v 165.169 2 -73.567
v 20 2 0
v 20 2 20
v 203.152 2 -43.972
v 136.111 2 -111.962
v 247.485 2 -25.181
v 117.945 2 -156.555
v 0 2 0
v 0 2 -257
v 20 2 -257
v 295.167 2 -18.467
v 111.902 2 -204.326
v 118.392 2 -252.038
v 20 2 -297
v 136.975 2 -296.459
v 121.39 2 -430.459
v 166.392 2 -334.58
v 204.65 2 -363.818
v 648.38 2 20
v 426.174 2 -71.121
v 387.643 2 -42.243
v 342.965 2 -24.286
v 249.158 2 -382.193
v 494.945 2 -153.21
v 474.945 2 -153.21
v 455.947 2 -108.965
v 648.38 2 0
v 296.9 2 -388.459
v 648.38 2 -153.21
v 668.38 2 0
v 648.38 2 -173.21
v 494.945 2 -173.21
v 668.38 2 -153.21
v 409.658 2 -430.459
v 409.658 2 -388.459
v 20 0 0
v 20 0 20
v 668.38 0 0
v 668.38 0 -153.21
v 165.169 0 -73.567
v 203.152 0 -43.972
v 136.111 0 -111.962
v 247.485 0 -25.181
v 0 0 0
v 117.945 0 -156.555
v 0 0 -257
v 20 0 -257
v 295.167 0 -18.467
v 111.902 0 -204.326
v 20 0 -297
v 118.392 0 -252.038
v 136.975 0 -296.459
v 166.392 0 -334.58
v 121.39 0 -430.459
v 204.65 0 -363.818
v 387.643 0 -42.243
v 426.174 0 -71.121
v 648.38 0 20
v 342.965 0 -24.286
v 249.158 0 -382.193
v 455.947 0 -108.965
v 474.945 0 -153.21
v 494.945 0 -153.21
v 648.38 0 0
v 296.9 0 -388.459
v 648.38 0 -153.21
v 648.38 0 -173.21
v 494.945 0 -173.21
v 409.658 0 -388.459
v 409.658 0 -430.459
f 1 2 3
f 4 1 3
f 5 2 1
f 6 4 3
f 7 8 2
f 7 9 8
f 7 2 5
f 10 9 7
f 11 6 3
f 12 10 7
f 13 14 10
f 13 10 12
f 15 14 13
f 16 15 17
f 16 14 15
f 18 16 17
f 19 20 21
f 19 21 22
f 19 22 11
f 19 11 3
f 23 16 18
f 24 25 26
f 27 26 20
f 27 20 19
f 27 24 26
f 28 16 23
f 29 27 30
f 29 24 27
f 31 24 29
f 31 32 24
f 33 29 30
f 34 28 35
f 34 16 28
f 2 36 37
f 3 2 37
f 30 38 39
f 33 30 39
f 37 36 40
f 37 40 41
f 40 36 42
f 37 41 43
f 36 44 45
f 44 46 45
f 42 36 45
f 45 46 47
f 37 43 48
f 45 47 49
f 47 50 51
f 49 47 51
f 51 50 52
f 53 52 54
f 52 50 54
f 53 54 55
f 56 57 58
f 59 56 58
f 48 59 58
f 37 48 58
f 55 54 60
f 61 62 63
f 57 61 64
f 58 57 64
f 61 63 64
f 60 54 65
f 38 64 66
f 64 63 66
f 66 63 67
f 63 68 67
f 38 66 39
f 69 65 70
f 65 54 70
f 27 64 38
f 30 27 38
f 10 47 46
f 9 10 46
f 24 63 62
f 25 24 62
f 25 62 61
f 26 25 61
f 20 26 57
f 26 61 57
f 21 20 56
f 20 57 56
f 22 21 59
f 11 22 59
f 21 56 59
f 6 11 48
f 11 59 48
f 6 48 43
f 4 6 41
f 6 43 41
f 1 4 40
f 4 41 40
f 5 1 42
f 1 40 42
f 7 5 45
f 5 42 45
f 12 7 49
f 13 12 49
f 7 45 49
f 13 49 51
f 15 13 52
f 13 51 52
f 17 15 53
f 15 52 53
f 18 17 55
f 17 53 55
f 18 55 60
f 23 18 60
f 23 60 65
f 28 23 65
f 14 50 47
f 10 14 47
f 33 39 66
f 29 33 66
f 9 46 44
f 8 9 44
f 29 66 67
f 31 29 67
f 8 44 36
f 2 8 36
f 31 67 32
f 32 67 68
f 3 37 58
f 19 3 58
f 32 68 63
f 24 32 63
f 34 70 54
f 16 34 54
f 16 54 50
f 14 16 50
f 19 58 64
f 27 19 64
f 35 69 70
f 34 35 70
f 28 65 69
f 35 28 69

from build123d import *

# Parameters (mm, degrees)
BOSS_EXTRUDE1_DEPTH = 2


with BuildPart() as part:
    # Sketch1 → Boss-Extrude1 (new body)
    with BuildSketch(Plane(origin=(0, 0, 0), x_dir=(1, 0, 0), z_dir=(0, 1, 0))):
        with BuildLine():
            Line((0, 0), (20, 0))
            Line((20, 0), (20, -20))
            Line((20, -20), (648.38, -20))
            Line((648.38, -20), (648.38, 0))
            Line((648.38, 0), (668.38, 0))
            Line((668.38, 0), (668.38, 153.21))
            Line((668.38, 153.21), (648.38, 153.21))
            Line((648.38, 153.21), (648.38, 173.21))
            Line((648.38, 173.21), (494.944943633, 173.21))
            Line((494.944943633, 173.21), (494.944943633, 153.21))
            Line((494.944943633, 153.21), (474.944943633, 153.21))
            ThreePointArc((474.944943633, 153.21), (149.385371312, 91.815127637), (296.9, 388.45935867))
            Line((296.9, 388.45935867), (409.658335612, 388.45935867))
            Line((409.658335612, 388.45935867), (409.658335612, 430.45935867))
            Line((409.658335612, 430.45935867), (121.389532072, 430.45935867))
            Line((121.389532072, 430.45935867), (20, 297))
            Line((20, 297), (20, 257))
            Line((20, 257), (0, 257))
            Line((0, 257), (0, 0))
        make_face()
    extrude(amount=BOSS_EXTRUDE1_DEPTH)


solid = part.part
